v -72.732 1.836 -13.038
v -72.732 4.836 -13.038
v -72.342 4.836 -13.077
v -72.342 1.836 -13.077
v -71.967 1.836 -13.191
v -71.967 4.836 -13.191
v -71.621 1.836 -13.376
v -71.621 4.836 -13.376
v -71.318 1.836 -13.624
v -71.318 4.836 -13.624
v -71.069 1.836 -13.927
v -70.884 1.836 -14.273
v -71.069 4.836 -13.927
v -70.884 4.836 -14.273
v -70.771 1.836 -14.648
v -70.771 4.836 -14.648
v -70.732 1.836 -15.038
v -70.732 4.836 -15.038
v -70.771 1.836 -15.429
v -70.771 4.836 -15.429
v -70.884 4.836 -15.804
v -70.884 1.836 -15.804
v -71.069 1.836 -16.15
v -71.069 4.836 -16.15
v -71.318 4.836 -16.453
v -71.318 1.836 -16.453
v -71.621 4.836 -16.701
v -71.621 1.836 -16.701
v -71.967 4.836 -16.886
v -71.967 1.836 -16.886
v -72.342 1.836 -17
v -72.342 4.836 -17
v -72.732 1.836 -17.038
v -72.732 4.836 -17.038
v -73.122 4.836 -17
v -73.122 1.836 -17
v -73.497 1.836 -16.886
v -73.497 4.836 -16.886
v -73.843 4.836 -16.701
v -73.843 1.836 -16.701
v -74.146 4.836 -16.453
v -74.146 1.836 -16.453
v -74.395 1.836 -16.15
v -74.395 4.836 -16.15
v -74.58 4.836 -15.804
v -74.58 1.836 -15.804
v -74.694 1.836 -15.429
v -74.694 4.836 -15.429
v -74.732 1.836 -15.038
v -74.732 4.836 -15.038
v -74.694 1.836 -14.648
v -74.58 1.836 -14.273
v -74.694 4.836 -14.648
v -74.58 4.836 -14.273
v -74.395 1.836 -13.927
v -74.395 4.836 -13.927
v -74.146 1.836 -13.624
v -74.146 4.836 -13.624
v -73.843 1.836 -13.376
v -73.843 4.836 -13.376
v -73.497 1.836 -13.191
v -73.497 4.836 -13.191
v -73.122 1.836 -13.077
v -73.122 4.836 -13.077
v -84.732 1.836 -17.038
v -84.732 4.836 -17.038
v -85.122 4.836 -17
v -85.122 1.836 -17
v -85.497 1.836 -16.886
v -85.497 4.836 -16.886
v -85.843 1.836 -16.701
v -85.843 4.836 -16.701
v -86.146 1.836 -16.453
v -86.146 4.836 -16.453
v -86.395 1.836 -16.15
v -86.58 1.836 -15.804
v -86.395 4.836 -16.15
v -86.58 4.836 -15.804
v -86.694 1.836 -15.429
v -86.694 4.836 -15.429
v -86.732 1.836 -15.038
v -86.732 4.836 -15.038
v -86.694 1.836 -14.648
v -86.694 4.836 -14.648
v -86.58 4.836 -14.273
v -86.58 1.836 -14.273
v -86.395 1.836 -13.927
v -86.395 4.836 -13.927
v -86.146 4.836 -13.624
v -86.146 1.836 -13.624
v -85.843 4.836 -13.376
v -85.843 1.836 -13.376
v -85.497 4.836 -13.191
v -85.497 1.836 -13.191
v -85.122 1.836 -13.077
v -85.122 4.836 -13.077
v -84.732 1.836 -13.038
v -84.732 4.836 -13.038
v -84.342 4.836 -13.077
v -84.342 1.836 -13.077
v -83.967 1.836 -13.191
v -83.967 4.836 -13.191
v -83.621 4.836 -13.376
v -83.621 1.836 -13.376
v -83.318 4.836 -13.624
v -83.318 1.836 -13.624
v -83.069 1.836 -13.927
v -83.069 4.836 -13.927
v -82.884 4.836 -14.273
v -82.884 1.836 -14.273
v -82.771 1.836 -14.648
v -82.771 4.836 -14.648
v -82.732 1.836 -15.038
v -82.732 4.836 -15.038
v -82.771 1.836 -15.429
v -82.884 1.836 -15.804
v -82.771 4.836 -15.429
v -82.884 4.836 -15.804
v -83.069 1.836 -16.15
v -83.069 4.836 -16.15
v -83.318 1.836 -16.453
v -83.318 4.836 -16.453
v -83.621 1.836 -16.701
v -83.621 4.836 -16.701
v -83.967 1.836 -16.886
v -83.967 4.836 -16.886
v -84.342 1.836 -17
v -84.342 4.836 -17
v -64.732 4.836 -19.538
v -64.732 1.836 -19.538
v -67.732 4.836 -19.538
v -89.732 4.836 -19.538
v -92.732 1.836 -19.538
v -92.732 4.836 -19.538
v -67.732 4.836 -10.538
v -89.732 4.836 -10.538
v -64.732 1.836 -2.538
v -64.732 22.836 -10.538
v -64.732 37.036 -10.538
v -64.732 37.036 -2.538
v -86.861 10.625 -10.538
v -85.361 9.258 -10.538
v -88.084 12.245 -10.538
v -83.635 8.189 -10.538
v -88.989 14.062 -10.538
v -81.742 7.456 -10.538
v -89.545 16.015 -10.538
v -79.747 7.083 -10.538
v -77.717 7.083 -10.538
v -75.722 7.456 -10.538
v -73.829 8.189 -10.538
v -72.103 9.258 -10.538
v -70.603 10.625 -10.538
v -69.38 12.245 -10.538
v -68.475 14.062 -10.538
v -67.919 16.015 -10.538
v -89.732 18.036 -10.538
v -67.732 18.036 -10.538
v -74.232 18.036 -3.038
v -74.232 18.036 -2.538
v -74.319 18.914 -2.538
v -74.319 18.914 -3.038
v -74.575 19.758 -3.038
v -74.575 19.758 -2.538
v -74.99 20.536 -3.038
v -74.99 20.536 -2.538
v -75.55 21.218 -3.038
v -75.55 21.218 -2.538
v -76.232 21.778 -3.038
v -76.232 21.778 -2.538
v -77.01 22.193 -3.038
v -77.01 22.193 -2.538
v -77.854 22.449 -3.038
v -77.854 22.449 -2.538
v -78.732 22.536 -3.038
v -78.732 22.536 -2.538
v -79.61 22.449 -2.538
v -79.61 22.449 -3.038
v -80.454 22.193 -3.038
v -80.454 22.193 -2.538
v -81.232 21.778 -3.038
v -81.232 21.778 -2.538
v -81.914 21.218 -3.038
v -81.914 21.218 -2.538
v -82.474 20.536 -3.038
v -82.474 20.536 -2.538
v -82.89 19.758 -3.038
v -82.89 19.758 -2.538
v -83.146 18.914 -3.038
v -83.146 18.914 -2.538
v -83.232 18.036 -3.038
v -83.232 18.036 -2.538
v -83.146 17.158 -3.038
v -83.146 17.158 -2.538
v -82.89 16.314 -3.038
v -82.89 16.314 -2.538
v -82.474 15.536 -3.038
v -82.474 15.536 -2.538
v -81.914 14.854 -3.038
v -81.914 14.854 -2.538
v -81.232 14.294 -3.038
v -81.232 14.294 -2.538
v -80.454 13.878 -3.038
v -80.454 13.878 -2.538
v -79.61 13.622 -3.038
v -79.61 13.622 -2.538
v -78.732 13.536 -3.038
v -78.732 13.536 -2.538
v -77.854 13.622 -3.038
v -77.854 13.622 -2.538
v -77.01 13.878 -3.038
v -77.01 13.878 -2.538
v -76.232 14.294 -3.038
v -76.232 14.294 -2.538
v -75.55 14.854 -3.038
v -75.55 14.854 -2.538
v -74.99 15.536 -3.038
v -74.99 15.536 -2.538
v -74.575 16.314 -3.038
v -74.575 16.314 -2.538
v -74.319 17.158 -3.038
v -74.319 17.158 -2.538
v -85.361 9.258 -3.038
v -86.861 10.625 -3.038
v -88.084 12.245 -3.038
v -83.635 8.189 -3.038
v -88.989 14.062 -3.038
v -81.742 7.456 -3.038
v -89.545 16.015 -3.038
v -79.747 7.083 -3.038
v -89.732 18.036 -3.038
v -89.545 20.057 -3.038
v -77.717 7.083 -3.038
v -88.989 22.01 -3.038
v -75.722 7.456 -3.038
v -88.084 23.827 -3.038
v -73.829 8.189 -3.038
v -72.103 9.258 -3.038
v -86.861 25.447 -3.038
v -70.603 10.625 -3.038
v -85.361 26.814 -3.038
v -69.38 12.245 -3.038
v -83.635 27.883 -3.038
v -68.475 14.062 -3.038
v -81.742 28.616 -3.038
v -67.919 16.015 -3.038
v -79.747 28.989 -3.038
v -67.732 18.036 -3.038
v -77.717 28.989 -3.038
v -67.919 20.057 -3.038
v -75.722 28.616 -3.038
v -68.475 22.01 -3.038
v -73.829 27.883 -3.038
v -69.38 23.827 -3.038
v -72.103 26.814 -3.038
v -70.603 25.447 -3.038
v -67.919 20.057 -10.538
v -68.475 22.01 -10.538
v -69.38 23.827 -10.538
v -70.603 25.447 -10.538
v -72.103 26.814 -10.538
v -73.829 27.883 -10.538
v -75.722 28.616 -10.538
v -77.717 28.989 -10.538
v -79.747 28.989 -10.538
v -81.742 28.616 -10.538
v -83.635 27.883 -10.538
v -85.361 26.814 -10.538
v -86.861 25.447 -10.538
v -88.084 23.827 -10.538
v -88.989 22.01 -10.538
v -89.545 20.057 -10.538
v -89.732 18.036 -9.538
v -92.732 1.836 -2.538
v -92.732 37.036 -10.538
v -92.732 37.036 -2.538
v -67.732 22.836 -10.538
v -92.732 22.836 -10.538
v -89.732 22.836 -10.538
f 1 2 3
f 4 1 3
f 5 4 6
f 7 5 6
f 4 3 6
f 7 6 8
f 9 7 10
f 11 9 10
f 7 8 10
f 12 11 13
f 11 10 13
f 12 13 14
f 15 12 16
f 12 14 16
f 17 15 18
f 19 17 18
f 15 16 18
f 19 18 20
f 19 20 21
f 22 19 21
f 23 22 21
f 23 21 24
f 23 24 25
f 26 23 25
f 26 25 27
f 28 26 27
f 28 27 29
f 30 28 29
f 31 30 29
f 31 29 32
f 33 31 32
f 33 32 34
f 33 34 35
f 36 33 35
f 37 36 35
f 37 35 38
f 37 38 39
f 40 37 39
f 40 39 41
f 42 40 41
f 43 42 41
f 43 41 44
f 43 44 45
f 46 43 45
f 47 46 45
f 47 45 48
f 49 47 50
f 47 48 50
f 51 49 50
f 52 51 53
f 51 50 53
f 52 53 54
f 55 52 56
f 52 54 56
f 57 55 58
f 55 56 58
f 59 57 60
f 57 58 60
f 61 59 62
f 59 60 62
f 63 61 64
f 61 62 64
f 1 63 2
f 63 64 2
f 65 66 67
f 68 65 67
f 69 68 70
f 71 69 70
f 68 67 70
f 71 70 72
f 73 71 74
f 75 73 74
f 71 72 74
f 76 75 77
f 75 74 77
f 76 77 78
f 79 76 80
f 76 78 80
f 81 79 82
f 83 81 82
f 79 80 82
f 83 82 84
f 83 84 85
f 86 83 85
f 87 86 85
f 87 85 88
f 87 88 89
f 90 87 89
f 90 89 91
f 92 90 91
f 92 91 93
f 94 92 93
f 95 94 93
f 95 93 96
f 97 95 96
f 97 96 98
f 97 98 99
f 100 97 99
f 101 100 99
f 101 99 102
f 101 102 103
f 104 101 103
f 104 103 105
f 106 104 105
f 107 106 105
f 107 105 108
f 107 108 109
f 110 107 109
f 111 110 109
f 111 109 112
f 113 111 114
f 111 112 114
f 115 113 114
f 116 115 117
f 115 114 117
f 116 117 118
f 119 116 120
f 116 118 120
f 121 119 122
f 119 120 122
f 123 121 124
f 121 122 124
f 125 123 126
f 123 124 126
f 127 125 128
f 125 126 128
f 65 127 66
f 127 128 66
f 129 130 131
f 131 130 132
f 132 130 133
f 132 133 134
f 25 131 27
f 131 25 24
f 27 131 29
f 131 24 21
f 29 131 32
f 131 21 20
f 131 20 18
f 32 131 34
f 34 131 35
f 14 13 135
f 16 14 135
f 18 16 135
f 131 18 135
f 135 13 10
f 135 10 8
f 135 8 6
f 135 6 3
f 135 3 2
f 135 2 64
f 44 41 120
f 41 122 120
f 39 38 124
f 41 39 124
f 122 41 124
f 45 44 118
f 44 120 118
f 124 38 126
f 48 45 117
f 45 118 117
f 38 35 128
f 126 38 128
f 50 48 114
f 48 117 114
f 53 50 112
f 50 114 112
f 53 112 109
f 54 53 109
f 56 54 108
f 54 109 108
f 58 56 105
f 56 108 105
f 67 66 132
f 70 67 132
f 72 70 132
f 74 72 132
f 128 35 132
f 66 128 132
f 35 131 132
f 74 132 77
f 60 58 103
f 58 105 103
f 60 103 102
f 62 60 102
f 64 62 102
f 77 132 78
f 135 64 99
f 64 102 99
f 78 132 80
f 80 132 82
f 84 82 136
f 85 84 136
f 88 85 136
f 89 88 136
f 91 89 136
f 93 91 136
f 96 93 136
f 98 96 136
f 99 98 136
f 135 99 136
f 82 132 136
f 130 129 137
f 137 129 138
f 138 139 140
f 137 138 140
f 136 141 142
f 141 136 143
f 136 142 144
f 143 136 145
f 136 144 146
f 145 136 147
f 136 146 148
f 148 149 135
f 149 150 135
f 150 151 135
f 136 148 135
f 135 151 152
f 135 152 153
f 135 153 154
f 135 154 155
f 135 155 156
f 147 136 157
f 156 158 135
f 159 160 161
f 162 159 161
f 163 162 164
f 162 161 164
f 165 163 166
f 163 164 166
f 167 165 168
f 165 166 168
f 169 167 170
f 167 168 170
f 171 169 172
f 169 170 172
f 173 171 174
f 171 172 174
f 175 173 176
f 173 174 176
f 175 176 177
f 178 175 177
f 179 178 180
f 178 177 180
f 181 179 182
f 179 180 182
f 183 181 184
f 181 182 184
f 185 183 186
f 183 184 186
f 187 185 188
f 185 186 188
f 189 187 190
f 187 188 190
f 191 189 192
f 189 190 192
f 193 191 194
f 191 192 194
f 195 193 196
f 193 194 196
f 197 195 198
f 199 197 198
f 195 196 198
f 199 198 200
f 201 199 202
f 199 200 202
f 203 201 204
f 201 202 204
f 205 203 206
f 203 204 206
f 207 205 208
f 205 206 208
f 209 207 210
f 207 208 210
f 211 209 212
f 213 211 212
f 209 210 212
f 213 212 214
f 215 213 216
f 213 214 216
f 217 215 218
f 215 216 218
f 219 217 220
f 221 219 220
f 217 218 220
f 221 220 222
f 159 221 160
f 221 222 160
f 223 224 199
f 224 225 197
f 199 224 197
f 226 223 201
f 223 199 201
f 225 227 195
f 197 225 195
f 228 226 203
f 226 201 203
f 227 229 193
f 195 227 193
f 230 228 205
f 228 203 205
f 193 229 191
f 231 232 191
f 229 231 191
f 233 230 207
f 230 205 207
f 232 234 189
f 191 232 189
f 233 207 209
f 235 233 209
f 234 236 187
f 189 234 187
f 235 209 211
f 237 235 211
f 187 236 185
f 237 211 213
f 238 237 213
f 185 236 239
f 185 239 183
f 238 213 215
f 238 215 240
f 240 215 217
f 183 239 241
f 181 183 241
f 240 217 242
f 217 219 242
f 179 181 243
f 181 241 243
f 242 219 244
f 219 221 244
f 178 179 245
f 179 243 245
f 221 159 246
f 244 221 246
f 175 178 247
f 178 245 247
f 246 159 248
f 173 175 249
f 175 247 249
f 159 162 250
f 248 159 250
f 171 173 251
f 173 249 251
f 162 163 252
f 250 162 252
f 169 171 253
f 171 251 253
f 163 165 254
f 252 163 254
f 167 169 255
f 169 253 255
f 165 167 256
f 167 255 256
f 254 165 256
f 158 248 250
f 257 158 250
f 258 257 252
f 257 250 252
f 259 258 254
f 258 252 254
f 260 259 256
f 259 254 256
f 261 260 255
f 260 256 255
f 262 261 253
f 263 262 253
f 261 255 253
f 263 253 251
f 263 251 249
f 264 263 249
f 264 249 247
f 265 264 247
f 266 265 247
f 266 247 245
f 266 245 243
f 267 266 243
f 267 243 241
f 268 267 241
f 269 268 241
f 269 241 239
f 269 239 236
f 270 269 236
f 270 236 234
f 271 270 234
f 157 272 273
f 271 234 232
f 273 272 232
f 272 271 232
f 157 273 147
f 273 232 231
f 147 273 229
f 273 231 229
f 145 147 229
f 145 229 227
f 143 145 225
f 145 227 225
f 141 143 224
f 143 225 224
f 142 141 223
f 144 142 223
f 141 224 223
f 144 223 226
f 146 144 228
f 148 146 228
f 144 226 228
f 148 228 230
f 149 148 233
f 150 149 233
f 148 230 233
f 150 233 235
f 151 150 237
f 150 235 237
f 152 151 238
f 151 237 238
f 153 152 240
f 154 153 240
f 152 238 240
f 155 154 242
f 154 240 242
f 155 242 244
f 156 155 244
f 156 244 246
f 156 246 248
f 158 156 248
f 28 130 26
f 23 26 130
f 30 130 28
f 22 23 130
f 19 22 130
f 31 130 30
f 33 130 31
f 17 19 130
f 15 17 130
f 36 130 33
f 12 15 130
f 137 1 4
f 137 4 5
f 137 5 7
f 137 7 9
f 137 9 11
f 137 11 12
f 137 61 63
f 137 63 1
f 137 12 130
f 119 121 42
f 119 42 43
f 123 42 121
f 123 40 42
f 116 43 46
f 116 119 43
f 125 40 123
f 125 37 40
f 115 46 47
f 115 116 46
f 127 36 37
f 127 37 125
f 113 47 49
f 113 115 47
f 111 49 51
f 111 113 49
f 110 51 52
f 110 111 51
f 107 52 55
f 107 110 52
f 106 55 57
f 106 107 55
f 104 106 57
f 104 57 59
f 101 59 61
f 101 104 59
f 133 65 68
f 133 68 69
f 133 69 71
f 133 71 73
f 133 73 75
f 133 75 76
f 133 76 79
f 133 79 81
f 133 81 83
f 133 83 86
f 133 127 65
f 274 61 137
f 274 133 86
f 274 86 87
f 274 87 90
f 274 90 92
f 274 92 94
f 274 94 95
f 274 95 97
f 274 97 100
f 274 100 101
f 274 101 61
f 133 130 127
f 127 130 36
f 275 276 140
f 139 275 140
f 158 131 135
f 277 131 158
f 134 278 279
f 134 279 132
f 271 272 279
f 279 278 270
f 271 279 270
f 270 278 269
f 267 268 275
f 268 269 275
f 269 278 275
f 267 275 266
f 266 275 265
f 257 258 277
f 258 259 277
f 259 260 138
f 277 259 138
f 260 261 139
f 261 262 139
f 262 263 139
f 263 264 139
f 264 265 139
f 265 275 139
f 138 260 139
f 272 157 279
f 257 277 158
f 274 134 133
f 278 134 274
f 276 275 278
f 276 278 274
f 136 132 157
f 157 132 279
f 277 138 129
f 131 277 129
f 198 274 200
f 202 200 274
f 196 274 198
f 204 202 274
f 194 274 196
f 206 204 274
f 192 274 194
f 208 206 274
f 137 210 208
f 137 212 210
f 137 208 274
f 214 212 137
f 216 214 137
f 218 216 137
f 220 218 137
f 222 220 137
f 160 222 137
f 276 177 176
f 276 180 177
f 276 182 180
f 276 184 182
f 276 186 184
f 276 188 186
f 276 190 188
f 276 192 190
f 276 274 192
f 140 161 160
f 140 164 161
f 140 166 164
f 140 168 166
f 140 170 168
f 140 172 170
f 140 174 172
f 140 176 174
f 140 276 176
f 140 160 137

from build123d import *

# Parameters (mm, degrees)
SKETCH2_W           = 28
SKETCH2_H           = 35.2
SKETCH2_R           = 11
BOSS_EXTRUDE3_DEPTH = 8
SKETCH3_W           = 10
SKETCH3_H           = 3
BOSS_EXTRUDE4_DEPTH = 28
BOSS_EXTRUDE5_DEPTH = 3
BOSS_EXTRUDE6_START = -28
BOSS_EXTRUDE6_DEPTH = 3
SKETCH4_R           = 2
CUT_EXTRUDE1_DEPTH  = 101.089134132
SKETCH2_3_R         = 11
SKETCH2_3_R_2       = 4.5
BOSS_EXTRUDE7_DEPTH = 0.5


with BuildPart() as part:
    # Sketch2 → Boss-Extrude3 (new body)
    with BuildSketch(Plane.XY.offset(-2.538447986)):
        with Locations((-78.732107824, 19.43595021)):
            Rectangle(SKETCH2_W, SKETCH2_H)
        with Locations((-78.732107824, 18.03595021)):
            Circle(SKETCH2_R, mode=Mode.SUBTRACT)
    extrude(amount=-BOSS_EXTRUDE3_DEPTH)

    # Sketch3 → Boss-Extrude4 (add)
    with BuildSketch(Plane.ZY.offset(92.732107824)):
        with Locations((-14.538447986, 3.33595021)):
            Rectangle(SKETCH3_W, SKETCH3_H)
    extrude(amount=-BOSS_EXTRUDE4_DEPTH)

    # Sketch3<3> → Boss-Extrude5 (add)
    with BuildSketch(Plane.ZY.offset(92.732107824)):
        Polygon((-19.538447986, 4.83595021), (-9.538447986, 4.83595021), (-9.538447986, 24.83595021), align=None)
    extrude(amount=-BOSS_EXTRUDE5_DEPTH)

    # Sketch3<4> → Boss-Extrude6 (add)
    with BuildSketch(Plane.ZY.offset(92.732107824).offset(BOSS_EXTRUDE6_START)):
        Polygon((-19.538447986, 4.83595021), (-9.538447986, 4.83595021), (-9.538447986, 24.83595021), (-10.538447986, 22.83595021), align=None)
    extrude(amount=BOSS_EXTRUDE6_DEPTH)

    # Sketch4 → Cut-Extrude1 (cut, through all)
    with BuildSketch(Plane(origin=(0, 4.83595021, 0), x_dir=(1, 0, 0), z_dir=(0, 1, 0))):
        with Locations(Location((-72.732107824, 15.038447986, 0), (0, 0, 270))):
            Circle(SKETCH4_R)
        with Locations(Location((-84.732107824, 15.038447986, 0), (0, 0, 90))):
            Circle(SKETCH4_R)
    extrude(amount=-CUT_EXTRUDE1_DEPTH, mode=Mode.SUBTRACT)

    # Sketch2<3> → Boss-Extrude7 (add)
    with BuildSketch(Plane.XY.offset(-2.538447986)):
        with Locations((-78.732107824, 18.03595021)):
            Circle(SKETCH2_3_R)
        with Locations((-78.732107824, 18.03595021)):
            Circle(SKETCH2_3_R_2, mode=Mode.SUBTRACT)
    extrude(amount=-BOSS_EXTRUDE7_DEPTH)


solid = part.part
